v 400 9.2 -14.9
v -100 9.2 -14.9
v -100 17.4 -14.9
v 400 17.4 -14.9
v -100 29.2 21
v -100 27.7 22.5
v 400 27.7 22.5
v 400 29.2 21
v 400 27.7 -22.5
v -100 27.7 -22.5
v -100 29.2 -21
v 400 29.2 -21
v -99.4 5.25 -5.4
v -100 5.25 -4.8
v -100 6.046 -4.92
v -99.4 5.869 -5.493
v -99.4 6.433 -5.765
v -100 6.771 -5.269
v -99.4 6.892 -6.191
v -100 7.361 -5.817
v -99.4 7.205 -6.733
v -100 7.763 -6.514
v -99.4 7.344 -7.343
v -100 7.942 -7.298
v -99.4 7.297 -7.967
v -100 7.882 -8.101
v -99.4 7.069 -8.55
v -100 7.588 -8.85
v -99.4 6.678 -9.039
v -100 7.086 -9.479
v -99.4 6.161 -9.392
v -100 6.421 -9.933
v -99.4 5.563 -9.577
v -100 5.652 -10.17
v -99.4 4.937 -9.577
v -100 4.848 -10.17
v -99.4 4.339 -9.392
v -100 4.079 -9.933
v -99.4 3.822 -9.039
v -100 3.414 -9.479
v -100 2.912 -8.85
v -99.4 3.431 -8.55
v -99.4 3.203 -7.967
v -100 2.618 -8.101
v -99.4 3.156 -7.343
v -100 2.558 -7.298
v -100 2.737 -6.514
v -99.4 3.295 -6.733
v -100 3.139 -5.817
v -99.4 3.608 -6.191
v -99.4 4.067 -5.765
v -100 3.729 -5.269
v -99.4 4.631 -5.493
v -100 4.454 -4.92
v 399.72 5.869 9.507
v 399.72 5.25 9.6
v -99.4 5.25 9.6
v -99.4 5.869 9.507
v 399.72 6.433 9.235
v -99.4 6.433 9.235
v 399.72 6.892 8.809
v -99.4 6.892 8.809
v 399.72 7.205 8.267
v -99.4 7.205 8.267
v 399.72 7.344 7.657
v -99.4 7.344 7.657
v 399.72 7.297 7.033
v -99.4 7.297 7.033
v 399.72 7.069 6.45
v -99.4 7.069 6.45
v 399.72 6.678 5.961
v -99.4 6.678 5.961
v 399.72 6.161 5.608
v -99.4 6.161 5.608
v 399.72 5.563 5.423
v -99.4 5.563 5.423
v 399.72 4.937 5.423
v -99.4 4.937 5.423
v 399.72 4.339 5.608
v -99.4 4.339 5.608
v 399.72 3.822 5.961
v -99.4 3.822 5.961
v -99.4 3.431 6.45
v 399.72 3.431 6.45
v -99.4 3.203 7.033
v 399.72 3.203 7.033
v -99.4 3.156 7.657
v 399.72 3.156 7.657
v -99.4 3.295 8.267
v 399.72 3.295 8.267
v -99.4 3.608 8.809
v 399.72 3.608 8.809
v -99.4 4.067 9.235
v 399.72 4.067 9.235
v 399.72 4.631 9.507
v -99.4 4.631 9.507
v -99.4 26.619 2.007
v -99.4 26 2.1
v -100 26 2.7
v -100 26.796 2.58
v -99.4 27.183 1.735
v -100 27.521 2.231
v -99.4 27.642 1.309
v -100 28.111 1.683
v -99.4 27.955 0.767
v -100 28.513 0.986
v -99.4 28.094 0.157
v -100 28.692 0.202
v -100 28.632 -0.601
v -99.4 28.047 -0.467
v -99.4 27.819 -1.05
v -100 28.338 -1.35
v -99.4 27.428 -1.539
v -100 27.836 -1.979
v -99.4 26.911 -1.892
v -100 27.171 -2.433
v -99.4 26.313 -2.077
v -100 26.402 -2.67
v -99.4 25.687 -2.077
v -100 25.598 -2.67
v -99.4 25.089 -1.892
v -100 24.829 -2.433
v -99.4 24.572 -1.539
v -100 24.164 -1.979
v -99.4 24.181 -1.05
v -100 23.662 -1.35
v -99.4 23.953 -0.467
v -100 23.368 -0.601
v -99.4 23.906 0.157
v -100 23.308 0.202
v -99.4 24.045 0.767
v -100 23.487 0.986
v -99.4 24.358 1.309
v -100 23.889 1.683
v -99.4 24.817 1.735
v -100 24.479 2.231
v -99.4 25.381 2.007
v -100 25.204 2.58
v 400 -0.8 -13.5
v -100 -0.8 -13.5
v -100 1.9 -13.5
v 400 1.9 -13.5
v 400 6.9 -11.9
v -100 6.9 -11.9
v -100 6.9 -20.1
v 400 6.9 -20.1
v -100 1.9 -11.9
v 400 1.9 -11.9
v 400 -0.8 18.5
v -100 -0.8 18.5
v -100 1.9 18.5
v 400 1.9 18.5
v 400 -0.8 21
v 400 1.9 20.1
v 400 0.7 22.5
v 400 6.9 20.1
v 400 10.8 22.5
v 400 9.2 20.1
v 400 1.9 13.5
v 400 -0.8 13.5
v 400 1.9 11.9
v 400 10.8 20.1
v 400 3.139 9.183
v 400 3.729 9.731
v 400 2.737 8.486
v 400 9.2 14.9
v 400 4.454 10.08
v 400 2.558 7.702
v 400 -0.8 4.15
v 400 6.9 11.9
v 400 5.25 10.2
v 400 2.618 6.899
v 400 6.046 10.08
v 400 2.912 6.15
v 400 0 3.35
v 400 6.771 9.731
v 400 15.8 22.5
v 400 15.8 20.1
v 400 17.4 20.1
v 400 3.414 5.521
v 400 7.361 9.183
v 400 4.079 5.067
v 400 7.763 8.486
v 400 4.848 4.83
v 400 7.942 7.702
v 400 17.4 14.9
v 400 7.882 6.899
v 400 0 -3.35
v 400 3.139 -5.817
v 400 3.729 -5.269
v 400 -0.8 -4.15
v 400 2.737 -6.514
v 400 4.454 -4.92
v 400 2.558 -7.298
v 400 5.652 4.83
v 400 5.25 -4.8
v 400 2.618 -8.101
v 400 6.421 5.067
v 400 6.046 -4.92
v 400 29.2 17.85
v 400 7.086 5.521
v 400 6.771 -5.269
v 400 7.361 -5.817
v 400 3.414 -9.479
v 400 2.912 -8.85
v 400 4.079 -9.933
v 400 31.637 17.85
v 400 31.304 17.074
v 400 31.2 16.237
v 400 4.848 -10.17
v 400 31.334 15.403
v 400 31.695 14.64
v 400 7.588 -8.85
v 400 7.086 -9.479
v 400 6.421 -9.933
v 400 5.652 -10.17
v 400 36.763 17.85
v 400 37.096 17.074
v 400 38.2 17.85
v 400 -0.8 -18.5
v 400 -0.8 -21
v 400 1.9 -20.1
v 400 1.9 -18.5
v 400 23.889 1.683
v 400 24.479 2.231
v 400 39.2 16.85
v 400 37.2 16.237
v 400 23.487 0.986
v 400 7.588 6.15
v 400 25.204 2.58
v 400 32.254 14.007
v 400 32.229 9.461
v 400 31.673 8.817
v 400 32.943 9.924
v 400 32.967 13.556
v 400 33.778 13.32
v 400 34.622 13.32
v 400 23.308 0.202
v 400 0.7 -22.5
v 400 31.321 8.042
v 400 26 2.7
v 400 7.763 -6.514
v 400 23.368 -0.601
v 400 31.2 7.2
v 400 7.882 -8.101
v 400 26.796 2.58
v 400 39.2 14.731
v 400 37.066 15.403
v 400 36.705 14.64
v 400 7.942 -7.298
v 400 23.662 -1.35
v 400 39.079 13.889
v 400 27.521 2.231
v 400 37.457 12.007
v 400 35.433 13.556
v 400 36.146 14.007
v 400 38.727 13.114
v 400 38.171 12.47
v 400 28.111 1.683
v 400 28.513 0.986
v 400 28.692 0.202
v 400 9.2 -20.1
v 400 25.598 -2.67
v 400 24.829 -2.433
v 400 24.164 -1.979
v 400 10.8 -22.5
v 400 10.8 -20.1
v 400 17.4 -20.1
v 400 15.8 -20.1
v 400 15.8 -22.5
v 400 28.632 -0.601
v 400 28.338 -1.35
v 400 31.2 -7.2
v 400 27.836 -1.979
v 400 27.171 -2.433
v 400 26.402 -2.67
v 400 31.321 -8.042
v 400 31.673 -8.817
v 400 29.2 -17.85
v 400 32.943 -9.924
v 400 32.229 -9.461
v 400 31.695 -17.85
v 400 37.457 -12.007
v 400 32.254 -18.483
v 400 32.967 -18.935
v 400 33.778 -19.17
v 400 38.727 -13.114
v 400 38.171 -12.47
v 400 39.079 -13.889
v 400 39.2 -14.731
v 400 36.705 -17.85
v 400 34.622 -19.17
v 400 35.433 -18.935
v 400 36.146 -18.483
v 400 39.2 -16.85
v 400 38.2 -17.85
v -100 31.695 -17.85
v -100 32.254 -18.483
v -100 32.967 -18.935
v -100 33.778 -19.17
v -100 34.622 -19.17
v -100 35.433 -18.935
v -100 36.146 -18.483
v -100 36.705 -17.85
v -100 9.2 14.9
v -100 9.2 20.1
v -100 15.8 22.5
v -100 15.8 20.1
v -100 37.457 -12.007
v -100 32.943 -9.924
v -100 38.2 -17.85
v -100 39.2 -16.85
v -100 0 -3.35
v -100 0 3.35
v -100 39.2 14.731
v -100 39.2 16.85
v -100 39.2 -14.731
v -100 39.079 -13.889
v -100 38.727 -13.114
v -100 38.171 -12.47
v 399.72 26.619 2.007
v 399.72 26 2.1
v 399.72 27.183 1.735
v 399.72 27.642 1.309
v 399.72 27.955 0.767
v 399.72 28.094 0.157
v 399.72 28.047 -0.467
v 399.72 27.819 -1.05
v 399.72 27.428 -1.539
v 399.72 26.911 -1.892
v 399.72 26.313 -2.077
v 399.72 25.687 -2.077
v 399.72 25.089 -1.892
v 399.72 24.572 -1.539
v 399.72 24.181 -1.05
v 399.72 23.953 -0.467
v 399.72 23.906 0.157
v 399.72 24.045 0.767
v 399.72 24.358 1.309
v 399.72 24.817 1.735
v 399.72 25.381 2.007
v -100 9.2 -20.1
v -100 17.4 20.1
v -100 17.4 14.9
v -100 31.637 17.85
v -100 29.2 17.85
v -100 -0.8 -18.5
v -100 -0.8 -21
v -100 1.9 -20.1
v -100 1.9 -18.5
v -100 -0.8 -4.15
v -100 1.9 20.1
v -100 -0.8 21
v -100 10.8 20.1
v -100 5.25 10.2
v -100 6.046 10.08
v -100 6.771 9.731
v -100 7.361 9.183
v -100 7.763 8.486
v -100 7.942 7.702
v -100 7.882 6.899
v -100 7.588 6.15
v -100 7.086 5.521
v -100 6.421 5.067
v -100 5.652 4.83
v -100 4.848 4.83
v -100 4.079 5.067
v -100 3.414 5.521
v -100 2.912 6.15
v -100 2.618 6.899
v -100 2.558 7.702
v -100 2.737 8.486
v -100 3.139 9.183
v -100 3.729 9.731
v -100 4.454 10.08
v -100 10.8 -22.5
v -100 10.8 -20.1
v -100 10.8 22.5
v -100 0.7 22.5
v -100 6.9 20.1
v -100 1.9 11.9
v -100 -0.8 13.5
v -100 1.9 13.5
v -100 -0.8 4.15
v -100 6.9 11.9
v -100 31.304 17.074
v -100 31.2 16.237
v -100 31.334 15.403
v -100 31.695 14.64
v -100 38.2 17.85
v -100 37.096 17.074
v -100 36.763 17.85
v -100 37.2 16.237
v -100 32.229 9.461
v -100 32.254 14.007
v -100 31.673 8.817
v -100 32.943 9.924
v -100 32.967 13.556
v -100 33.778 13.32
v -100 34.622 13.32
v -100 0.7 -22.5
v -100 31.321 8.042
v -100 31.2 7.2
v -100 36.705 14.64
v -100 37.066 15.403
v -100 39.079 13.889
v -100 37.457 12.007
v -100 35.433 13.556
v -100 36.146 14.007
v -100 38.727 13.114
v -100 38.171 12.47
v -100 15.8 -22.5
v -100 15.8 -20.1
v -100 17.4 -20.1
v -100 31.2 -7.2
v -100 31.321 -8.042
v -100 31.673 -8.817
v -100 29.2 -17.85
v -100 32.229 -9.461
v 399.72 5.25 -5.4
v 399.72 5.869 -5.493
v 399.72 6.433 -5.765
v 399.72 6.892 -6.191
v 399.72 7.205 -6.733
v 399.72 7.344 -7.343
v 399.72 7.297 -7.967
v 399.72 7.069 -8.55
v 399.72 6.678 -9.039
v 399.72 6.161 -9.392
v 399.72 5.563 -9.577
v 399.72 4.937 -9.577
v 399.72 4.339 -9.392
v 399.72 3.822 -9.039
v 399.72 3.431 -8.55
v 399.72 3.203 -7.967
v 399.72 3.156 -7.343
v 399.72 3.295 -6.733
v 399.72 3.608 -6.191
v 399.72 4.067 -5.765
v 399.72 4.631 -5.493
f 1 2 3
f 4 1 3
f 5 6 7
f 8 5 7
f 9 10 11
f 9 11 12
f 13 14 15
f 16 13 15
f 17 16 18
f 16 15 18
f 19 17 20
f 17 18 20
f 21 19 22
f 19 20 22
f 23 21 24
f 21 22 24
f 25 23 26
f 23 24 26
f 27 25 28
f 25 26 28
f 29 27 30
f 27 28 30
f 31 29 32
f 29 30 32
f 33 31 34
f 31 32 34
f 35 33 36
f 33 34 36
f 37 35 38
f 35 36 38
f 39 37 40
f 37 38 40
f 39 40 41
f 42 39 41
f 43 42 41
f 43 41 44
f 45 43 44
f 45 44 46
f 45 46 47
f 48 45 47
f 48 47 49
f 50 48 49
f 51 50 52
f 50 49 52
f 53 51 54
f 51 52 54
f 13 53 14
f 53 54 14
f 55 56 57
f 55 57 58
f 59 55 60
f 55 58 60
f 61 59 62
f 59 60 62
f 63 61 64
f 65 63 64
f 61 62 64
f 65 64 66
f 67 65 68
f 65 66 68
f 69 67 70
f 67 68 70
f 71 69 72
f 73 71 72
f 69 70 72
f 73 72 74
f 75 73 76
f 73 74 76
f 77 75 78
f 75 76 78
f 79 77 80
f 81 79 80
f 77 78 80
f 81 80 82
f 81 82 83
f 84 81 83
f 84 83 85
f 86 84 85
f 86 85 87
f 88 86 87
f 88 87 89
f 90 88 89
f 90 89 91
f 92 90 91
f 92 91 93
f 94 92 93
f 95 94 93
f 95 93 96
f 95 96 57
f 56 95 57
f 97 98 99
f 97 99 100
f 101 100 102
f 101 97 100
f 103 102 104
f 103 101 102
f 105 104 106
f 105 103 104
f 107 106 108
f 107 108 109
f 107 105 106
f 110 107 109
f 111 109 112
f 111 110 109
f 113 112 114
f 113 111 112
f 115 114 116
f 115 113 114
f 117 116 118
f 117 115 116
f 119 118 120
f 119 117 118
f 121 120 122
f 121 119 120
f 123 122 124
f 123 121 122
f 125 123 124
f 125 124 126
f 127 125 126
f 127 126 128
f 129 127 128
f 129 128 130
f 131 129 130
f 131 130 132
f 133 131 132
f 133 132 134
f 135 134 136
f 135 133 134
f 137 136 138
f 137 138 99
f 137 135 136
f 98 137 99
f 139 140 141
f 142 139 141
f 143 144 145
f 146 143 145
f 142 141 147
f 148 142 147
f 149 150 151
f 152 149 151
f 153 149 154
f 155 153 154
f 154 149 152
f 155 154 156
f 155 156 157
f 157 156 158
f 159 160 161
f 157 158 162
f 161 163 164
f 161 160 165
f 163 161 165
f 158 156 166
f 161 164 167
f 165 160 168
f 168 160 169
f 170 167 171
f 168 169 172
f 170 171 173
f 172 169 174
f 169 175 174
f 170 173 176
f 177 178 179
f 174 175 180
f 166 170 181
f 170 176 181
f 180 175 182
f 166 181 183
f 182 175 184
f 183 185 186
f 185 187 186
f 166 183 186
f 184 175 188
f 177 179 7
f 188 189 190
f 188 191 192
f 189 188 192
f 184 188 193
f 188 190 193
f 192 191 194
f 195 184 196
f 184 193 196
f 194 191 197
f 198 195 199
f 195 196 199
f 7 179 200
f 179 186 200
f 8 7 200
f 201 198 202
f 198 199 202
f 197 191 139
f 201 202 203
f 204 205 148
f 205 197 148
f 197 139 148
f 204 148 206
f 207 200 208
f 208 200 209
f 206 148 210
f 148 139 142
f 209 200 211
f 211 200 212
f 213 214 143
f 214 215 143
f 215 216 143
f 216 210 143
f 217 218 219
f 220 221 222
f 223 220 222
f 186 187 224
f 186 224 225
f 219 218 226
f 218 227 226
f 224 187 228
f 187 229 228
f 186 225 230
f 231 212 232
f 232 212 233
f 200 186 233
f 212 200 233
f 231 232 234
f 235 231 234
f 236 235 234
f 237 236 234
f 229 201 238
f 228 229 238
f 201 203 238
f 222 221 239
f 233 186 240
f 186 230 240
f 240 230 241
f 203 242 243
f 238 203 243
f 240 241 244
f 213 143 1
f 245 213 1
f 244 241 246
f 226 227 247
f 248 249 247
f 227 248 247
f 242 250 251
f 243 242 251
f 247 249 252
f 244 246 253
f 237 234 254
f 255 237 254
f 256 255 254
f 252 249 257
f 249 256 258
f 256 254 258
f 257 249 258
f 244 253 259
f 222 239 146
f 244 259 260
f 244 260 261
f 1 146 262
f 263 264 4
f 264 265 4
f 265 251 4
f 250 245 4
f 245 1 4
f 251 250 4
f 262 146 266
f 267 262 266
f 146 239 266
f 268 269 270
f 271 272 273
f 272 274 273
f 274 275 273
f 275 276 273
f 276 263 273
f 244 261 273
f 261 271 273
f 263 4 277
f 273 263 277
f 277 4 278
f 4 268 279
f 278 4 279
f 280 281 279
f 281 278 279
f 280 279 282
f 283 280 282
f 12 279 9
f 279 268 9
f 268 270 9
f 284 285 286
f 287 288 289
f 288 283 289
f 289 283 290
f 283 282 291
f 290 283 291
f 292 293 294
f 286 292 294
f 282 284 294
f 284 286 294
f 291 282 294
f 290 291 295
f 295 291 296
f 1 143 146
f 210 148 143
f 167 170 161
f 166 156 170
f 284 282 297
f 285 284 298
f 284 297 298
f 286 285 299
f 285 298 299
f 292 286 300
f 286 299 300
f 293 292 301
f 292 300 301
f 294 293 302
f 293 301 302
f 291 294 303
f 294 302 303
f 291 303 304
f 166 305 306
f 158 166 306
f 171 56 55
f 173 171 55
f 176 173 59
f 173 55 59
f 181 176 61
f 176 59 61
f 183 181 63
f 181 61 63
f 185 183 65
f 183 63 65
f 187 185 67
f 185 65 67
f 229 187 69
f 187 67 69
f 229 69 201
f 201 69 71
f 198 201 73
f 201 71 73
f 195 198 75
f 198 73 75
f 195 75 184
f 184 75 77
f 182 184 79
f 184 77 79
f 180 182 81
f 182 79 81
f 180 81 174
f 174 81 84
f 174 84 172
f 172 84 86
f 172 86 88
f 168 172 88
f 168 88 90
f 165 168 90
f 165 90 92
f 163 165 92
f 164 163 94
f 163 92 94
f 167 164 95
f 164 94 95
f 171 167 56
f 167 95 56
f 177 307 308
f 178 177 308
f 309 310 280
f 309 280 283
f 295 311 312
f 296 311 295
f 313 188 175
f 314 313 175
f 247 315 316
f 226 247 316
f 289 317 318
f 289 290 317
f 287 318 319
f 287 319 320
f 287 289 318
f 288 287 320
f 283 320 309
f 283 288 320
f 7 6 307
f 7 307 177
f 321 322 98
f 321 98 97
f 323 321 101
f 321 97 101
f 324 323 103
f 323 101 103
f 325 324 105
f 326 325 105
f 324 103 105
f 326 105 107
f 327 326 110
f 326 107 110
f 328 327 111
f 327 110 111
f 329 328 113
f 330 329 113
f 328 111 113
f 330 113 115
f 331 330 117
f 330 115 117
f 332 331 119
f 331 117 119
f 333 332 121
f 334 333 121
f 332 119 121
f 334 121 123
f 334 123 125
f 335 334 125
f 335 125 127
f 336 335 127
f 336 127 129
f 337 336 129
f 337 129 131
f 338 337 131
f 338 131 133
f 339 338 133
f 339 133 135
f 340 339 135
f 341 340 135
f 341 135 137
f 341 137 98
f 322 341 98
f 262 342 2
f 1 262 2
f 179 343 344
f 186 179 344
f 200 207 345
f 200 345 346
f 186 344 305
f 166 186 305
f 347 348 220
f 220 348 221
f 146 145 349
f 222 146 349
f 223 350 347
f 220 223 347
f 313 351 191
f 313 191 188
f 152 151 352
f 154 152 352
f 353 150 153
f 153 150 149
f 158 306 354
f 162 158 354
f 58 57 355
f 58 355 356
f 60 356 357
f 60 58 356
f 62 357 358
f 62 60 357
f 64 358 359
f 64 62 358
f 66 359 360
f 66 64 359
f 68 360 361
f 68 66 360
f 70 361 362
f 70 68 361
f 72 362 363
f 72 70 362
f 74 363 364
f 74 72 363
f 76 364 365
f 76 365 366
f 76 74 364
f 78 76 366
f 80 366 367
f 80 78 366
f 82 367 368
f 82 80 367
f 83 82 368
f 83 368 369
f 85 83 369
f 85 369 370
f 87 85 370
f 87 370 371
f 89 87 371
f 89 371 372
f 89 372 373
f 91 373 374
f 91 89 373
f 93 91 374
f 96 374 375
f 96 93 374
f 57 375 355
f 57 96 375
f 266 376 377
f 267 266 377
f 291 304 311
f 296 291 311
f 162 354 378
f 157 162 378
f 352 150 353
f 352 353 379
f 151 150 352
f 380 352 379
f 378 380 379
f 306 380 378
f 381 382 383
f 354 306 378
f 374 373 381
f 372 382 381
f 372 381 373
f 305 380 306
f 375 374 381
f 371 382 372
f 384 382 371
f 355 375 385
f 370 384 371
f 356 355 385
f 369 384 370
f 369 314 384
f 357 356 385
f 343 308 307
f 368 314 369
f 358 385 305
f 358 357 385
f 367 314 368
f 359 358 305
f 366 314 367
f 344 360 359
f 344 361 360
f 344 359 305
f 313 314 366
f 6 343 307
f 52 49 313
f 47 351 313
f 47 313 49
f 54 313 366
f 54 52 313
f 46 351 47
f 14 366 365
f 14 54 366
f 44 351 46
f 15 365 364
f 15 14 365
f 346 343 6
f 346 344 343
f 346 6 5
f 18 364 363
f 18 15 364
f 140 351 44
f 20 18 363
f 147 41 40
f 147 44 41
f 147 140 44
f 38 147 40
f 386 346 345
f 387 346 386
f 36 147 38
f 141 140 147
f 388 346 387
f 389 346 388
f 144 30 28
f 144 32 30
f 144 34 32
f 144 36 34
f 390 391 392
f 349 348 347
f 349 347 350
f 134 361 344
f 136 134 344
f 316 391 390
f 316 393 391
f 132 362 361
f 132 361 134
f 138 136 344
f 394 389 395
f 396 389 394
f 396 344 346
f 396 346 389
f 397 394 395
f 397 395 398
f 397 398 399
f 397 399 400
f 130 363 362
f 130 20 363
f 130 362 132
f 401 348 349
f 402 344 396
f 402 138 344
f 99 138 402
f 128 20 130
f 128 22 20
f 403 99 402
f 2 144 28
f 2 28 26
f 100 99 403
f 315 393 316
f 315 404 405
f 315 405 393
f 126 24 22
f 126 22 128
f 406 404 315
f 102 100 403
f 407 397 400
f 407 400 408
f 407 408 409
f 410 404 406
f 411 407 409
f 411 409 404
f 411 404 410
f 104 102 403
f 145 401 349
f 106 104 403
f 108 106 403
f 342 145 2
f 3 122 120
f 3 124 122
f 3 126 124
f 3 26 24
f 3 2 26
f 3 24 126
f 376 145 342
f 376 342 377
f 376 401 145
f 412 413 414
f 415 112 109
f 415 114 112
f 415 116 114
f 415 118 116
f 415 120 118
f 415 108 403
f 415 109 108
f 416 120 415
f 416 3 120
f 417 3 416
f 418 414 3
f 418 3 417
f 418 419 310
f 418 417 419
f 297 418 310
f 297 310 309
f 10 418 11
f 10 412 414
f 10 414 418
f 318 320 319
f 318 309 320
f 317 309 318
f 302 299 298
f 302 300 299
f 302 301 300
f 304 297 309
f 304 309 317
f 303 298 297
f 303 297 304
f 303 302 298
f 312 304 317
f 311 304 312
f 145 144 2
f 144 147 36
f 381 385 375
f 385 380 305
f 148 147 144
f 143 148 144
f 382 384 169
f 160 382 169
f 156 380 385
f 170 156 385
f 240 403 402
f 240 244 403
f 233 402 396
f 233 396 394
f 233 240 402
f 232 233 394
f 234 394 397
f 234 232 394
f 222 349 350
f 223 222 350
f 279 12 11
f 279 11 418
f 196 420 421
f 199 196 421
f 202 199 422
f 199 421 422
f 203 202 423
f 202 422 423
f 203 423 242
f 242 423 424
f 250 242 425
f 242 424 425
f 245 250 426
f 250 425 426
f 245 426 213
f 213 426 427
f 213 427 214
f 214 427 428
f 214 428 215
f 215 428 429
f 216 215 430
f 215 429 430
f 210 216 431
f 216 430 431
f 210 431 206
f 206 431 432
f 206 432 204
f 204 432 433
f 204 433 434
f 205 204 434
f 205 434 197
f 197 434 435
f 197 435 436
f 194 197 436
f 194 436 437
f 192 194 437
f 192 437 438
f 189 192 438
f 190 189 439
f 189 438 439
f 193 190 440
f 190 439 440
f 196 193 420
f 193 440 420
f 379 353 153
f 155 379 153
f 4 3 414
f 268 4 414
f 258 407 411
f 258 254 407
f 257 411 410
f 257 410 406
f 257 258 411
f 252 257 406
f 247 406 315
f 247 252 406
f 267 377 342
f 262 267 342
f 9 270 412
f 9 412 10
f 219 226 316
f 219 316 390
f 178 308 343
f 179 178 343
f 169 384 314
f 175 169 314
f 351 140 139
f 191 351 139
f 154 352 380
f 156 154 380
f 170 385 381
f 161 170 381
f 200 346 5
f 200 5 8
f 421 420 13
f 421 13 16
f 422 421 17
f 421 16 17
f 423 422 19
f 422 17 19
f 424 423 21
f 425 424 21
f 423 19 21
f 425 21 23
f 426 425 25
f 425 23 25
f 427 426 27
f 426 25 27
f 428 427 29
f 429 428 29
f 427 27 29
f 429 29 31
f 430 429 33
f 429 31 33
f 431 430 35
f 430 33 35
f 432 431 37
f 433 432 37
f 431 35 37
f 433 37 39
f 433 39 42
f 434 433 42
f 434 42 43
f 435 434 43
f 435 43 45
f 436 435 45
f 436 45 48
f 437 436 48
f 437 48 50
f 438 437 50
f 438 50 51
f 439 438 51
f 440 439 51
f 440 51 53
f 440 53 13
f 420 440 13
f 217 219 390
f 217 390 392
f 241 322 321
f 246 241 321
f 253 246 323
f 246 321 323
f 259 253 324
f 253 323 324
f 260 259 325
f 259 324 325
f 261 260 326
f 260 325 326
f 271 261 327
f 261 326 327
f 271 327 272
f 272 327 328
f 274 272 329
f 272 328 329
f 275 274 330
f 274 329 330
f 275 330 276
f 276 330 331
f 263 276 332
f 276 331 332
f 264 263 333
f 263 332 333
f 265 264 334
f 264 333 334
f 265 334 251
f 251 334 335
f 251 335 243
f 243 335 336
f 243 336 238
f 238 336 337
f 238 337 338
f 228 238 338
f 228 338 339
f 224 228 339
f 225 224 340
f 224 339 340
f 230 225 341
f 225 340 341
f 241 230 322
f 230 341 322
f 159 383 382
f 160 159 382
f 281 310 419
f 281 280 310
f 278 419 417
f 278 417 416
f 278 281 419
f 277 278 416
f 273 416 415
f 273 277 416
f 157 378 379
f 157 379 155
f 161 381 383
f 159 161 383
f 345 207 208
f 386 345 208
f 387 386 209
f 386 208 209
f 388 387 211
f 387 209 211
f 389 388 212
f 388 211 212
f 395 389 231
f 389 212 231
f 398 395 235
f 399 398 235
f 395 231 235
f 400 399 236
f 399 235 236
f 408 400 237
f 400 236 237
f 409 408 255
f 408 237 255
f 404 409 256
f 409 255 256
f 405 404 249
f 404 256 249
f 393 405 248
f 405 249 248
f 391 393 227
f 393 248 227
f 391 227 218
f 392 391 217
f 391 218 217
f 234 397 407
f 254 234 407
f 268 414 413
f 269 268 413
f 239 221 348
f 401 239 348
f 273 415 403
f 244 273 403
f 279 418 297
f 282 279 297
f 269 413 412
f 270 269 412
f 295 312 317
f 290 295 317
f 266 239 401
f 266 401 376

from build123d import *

# Parameters (mm, degrees)
EXTRUDE_1_DEPTH                = 500
SKETCH_2_W                     = 500
SKETCH_2_H                     = 30
EXTRUDE_2_DEPTH                = 4.65
CUT_EXTRUDE_1_DEPTH            = 501
CUT_EXTRUDE_2_DEPTH            = 501
SKETCH_5_W                     = 6.7
SKETCH_5_H                     = 0.8
CUT_EXTRUDE_3_DEPTH            = 501
CUT_EXTRUDE_4_DEPTH            = 501
CUT_EXTRUDE_5_DEPTH            = 501
CUT_EXTRUDE_6_DEPTH            = 501
SKETCH_9_W                     = 18.238994336
SKETCH_9_H                     = 8
CUT_EXTRUDE_7_DEPTH            = 501
DRAFT_1_ANGLE                  = 45
DRAFT_2_ANGLE                  = 24.775140569
F_4_2_4_2_DIAMETER_HOLE1_D     = 4.2
F_4_2_4_2_DIAMETER_HOLE1_DEPTH = 500
F_6_0_6_DIAMETER_HOLE1_D       = 6
F_6_0_6_DIAMETER_HOLE1_DEPTH   = 500
CHAMFER_1_SIZE                 = 0.6
CHAMFER_1_SIZE2                = 0.279784595
CHAMFER_2_SIZE                 = 0.6
CHAMFER_3_SIZE                 = 1
CHAMFER_4_SIZE                 = 1.5
FILLET_1_R                     = 3


with BuildPart() as part:
    # 스케치1 → 보스-돌출1 (new body)
    with BuildSketch(Plane(origin=(400, 0, 0), x_dir=(0, 0, -1), z_dir=(1, 0, 0))):
        Polygon((-17.85, 38.2), (-17.85, -0.8), (22.5, -0.8), (22.5, 39.2), (-16.85, 39.2), align=None)
    extrude(amount=-EXTRUDE_1_DEPTH)

    # 스케치2 → 보스-돌출2 (add)
    with BuildSketch(Plane.XY.offset(17.85)):
        with Locations((150, 14.2)):
            Rectangle(SKETCH_2_W, SKETCH_2_H)
    extrude(amount=EXTRUDE_2_DEPTH)

    # 스케치3 → 컷-돌출1 (cut, through all)
    with BuildSketch(Plane.ZY.offset(100)):
        Polygon((22.5, 10.8), (22.5, 15.8), (20.1, 15.8), (20.1, 17.4), (14.9, 17.4), (14.9, 9.2), (20.1, 9.2), (20.1, 10.8), align=None)
    extrude(amount=-CUT_EXTRUDE_1_DEPTH, mode=Mode.SUBTRACT)

    # 스케치4 → 컷-돌출2 (cut, through all)
    with BuildSketch(Plane.ZY.offset(100)):
        Polygon((13.5, -0.8), (18.5, -0.8), (18.5, 1.9), (20.1, 1.9), (20.1, 6.9), (11.9, 6.9), (11.9, 1.9), (13.5, 1.9), align=None)
    extrude(amount=-CUT_EXTRUDE_2_DEPTH, mode=Mode.SUBTRACT)

    # 스케치5 → 컷-돌출3 (cut, through all)
    with BuildSketch(Plane.ZY.offset(100)):
        with Locations((0, -0.4)):
            Rectangle(SKETCH_5_W, SKETCH_5_H)
    extrude(amount=-CUT_EXTRUDE_3_DEPTH, mode=Mode.SUBTRACT)

    # 스케치6 → 컷-돌출4 (cut, through all)
    with BuildSketch(Plane.ZY.offset(100)):
        Polygon((-18.5, -0.8), (-13.5, -0.8), (-13.5, 1.9), (-11.9, 1.9), (-11.9, 6.9), (-20.1, 6.9), (-20.1, 1.9), (-18.5, 1.9), align=None)
    extrude(amount=-CUT_EXTRUDE_4_DEPTH, mode=Mode.SUBTRACT)

    # 스케치7 → 컷-돌출5 (cut, through all)
    with BuildSketch(Plane.ZY.offset(100)):
        Polygon((-22.5, 15.8), (-22.5, 10.8), (-20.1, 10.8), (-20.1, 9.2), (-14.9, 9.2), (-14.9, 17.4), (-20.1, 17.4), (-20.1, 15.8), align=None)
    extrude(amount=-CUT_EXTRUDE_5_DEPTH, mode=Mode.SUBTRACT)

    # 스케치8 → 컷-돌출6 (cut, through all)
    with BuildSketch(Plane.ZY.offset(100)):
        with BuildLine():
            Line((-17.85, 36.705493963), (-17.85, 39.2))
            Line((-17.85, 39.2), (-22.5, 39.2))
            Line((-22.5, 39.2), (-22.5, 29.2))
            Line((-22.5, 29.2), (-17.85, 29.2))
            Line((-17.85, 29.2), (-17.85, 31.694506037))
            ThreePointArc((-17.85, 31.694506037), (-19.2, 34.2), (-17.85, 36.705493963))
        make_face()
    extrude(amount=-CUT_EXTRUDE_6_DEPTH, mode=Mode.SUBTRACT)

    # 스케치9 → 컷-돌출7 (cut, through all)
    with BuildSketch(Plane.ZY.offset(100)):
        with Locations((0, 35.2)):
            Rectangle(SKETCH_9_W, SKETCH_9_H)
    extrude(amount=-CUT_EXTRUDE_7_DEPTH, mode=Mode.SUBTRACT)

    # 구배1
    draft_1_faces = [part.faces().sort_by_distance(p)[0] for p in [
        (150, -0.4, 3.35),
        (150, -0.4, -3.35),
    ]]
    draft(draft_1_faces, Plane(origin=(400, 0, 3.35), x_dir=(0, 0, -1), z_dir=(0, -1, 0)), DRAFT_1_ANGLE)

    # 구배2
    draft_2_faces = [part.faces().sort_by_distance(p)[0] for p in [
        (150, 35.2, 9.119497168),
        (150, 35.2, -9.119497168),
    ]]
    draft(draft_2_faces, Plane(origin=(400, 31.2, -9.119497168), x_dir=(0, 0, 1), z_dir=(0, 1, 0)), DRAFT_2_ANGLE)

    # Ø4.2 (4.2) Diameter Hole1
    with Locations(Plane(origin=(400, 0, 0), x_dir=(0, 0, -1), z_dir=(1, 0, 0))):
        with Locations((-7.5, 5.25), (7.5, 5.25), (0, 26)):
            Hole(F_4_2_4_2_DIAMETER_HOLE1_D / 2, depth=F_4_2_4_2_DIAMETER_HOLE1_DEPTH)

    # Ø6.0 (6) Diameter Hole1
    with Locations(Plane.ZY.offset(100)):
        with Locations((16.290651015, 34.2)):
            Hole(F_6_0_6_DIAMETER_HOLE1_D / 2, depth=F_6_0_6_DIAMETER_HOLE1_DEPTH)

    # 모따기1
    chamfer_1_edges = [part.edges().sort_by_distance(p)[0] for p in [
        (400, 26, -2.1),
        (400, 5.25, -9.6),
        (400, 5.25, 5.4),
    ]]
    chamfer_1_side = [part.faces().sort_by_distance(p)[0] for p in [
        (400, 17.793427641, -0.369480422),
    ]]
    chamfer(chamfer_1_edges, length=CHAMFER_1_SIZE, length2=CHAMFER_1_SIZE2, reference=chamfer_1_side[0])

    # 모따기2
    chamfer_2_edges = [part.edges().sort_by_distance(p)[0] for p in [
        (-100, 26, -2.1),
        (-100, 5.25, -9.6),
        (-100, 5.25, 5.4),
    ]]
    chamfer(chamfer_2_edges, length=CHAMFER_2_SIZE)

    # 모따기3
    chamfer_3_edges = [part.edges().sort_by_distance(p)[0] for p in [
        (150, 39.2, -17.85),
    ]]
    chamfer(chamfer_3_edges, length=CHAMFER_3_SIZE)

    # 모따기4
    chamfer_4_edges = [part.edges().sort_by_distance(p)[0] for p in [
        (150, 29.2, -22.5),
        (150, 29.2, 22.5),
        (150, -0.8, 22.5),
        (150, -0.8, -22.5),
    ]]
    chamfer(chamfer_4_edges, length=CHAMFER_4_SIZE)

    # 필렛1
    fillet_1_edges = [part.edges().sort_by_distance(p)[0] for p in [
        (150, 39.2, -12.811804861),
        (150, 39.2, 12.811804861),
        (150, 31.2, 9.119497168),
        (150, 31.2, -9.119497168),
    ]]
    fillet(fillet_1_edges, radius=FILLET_1_R)


solid = part.part
